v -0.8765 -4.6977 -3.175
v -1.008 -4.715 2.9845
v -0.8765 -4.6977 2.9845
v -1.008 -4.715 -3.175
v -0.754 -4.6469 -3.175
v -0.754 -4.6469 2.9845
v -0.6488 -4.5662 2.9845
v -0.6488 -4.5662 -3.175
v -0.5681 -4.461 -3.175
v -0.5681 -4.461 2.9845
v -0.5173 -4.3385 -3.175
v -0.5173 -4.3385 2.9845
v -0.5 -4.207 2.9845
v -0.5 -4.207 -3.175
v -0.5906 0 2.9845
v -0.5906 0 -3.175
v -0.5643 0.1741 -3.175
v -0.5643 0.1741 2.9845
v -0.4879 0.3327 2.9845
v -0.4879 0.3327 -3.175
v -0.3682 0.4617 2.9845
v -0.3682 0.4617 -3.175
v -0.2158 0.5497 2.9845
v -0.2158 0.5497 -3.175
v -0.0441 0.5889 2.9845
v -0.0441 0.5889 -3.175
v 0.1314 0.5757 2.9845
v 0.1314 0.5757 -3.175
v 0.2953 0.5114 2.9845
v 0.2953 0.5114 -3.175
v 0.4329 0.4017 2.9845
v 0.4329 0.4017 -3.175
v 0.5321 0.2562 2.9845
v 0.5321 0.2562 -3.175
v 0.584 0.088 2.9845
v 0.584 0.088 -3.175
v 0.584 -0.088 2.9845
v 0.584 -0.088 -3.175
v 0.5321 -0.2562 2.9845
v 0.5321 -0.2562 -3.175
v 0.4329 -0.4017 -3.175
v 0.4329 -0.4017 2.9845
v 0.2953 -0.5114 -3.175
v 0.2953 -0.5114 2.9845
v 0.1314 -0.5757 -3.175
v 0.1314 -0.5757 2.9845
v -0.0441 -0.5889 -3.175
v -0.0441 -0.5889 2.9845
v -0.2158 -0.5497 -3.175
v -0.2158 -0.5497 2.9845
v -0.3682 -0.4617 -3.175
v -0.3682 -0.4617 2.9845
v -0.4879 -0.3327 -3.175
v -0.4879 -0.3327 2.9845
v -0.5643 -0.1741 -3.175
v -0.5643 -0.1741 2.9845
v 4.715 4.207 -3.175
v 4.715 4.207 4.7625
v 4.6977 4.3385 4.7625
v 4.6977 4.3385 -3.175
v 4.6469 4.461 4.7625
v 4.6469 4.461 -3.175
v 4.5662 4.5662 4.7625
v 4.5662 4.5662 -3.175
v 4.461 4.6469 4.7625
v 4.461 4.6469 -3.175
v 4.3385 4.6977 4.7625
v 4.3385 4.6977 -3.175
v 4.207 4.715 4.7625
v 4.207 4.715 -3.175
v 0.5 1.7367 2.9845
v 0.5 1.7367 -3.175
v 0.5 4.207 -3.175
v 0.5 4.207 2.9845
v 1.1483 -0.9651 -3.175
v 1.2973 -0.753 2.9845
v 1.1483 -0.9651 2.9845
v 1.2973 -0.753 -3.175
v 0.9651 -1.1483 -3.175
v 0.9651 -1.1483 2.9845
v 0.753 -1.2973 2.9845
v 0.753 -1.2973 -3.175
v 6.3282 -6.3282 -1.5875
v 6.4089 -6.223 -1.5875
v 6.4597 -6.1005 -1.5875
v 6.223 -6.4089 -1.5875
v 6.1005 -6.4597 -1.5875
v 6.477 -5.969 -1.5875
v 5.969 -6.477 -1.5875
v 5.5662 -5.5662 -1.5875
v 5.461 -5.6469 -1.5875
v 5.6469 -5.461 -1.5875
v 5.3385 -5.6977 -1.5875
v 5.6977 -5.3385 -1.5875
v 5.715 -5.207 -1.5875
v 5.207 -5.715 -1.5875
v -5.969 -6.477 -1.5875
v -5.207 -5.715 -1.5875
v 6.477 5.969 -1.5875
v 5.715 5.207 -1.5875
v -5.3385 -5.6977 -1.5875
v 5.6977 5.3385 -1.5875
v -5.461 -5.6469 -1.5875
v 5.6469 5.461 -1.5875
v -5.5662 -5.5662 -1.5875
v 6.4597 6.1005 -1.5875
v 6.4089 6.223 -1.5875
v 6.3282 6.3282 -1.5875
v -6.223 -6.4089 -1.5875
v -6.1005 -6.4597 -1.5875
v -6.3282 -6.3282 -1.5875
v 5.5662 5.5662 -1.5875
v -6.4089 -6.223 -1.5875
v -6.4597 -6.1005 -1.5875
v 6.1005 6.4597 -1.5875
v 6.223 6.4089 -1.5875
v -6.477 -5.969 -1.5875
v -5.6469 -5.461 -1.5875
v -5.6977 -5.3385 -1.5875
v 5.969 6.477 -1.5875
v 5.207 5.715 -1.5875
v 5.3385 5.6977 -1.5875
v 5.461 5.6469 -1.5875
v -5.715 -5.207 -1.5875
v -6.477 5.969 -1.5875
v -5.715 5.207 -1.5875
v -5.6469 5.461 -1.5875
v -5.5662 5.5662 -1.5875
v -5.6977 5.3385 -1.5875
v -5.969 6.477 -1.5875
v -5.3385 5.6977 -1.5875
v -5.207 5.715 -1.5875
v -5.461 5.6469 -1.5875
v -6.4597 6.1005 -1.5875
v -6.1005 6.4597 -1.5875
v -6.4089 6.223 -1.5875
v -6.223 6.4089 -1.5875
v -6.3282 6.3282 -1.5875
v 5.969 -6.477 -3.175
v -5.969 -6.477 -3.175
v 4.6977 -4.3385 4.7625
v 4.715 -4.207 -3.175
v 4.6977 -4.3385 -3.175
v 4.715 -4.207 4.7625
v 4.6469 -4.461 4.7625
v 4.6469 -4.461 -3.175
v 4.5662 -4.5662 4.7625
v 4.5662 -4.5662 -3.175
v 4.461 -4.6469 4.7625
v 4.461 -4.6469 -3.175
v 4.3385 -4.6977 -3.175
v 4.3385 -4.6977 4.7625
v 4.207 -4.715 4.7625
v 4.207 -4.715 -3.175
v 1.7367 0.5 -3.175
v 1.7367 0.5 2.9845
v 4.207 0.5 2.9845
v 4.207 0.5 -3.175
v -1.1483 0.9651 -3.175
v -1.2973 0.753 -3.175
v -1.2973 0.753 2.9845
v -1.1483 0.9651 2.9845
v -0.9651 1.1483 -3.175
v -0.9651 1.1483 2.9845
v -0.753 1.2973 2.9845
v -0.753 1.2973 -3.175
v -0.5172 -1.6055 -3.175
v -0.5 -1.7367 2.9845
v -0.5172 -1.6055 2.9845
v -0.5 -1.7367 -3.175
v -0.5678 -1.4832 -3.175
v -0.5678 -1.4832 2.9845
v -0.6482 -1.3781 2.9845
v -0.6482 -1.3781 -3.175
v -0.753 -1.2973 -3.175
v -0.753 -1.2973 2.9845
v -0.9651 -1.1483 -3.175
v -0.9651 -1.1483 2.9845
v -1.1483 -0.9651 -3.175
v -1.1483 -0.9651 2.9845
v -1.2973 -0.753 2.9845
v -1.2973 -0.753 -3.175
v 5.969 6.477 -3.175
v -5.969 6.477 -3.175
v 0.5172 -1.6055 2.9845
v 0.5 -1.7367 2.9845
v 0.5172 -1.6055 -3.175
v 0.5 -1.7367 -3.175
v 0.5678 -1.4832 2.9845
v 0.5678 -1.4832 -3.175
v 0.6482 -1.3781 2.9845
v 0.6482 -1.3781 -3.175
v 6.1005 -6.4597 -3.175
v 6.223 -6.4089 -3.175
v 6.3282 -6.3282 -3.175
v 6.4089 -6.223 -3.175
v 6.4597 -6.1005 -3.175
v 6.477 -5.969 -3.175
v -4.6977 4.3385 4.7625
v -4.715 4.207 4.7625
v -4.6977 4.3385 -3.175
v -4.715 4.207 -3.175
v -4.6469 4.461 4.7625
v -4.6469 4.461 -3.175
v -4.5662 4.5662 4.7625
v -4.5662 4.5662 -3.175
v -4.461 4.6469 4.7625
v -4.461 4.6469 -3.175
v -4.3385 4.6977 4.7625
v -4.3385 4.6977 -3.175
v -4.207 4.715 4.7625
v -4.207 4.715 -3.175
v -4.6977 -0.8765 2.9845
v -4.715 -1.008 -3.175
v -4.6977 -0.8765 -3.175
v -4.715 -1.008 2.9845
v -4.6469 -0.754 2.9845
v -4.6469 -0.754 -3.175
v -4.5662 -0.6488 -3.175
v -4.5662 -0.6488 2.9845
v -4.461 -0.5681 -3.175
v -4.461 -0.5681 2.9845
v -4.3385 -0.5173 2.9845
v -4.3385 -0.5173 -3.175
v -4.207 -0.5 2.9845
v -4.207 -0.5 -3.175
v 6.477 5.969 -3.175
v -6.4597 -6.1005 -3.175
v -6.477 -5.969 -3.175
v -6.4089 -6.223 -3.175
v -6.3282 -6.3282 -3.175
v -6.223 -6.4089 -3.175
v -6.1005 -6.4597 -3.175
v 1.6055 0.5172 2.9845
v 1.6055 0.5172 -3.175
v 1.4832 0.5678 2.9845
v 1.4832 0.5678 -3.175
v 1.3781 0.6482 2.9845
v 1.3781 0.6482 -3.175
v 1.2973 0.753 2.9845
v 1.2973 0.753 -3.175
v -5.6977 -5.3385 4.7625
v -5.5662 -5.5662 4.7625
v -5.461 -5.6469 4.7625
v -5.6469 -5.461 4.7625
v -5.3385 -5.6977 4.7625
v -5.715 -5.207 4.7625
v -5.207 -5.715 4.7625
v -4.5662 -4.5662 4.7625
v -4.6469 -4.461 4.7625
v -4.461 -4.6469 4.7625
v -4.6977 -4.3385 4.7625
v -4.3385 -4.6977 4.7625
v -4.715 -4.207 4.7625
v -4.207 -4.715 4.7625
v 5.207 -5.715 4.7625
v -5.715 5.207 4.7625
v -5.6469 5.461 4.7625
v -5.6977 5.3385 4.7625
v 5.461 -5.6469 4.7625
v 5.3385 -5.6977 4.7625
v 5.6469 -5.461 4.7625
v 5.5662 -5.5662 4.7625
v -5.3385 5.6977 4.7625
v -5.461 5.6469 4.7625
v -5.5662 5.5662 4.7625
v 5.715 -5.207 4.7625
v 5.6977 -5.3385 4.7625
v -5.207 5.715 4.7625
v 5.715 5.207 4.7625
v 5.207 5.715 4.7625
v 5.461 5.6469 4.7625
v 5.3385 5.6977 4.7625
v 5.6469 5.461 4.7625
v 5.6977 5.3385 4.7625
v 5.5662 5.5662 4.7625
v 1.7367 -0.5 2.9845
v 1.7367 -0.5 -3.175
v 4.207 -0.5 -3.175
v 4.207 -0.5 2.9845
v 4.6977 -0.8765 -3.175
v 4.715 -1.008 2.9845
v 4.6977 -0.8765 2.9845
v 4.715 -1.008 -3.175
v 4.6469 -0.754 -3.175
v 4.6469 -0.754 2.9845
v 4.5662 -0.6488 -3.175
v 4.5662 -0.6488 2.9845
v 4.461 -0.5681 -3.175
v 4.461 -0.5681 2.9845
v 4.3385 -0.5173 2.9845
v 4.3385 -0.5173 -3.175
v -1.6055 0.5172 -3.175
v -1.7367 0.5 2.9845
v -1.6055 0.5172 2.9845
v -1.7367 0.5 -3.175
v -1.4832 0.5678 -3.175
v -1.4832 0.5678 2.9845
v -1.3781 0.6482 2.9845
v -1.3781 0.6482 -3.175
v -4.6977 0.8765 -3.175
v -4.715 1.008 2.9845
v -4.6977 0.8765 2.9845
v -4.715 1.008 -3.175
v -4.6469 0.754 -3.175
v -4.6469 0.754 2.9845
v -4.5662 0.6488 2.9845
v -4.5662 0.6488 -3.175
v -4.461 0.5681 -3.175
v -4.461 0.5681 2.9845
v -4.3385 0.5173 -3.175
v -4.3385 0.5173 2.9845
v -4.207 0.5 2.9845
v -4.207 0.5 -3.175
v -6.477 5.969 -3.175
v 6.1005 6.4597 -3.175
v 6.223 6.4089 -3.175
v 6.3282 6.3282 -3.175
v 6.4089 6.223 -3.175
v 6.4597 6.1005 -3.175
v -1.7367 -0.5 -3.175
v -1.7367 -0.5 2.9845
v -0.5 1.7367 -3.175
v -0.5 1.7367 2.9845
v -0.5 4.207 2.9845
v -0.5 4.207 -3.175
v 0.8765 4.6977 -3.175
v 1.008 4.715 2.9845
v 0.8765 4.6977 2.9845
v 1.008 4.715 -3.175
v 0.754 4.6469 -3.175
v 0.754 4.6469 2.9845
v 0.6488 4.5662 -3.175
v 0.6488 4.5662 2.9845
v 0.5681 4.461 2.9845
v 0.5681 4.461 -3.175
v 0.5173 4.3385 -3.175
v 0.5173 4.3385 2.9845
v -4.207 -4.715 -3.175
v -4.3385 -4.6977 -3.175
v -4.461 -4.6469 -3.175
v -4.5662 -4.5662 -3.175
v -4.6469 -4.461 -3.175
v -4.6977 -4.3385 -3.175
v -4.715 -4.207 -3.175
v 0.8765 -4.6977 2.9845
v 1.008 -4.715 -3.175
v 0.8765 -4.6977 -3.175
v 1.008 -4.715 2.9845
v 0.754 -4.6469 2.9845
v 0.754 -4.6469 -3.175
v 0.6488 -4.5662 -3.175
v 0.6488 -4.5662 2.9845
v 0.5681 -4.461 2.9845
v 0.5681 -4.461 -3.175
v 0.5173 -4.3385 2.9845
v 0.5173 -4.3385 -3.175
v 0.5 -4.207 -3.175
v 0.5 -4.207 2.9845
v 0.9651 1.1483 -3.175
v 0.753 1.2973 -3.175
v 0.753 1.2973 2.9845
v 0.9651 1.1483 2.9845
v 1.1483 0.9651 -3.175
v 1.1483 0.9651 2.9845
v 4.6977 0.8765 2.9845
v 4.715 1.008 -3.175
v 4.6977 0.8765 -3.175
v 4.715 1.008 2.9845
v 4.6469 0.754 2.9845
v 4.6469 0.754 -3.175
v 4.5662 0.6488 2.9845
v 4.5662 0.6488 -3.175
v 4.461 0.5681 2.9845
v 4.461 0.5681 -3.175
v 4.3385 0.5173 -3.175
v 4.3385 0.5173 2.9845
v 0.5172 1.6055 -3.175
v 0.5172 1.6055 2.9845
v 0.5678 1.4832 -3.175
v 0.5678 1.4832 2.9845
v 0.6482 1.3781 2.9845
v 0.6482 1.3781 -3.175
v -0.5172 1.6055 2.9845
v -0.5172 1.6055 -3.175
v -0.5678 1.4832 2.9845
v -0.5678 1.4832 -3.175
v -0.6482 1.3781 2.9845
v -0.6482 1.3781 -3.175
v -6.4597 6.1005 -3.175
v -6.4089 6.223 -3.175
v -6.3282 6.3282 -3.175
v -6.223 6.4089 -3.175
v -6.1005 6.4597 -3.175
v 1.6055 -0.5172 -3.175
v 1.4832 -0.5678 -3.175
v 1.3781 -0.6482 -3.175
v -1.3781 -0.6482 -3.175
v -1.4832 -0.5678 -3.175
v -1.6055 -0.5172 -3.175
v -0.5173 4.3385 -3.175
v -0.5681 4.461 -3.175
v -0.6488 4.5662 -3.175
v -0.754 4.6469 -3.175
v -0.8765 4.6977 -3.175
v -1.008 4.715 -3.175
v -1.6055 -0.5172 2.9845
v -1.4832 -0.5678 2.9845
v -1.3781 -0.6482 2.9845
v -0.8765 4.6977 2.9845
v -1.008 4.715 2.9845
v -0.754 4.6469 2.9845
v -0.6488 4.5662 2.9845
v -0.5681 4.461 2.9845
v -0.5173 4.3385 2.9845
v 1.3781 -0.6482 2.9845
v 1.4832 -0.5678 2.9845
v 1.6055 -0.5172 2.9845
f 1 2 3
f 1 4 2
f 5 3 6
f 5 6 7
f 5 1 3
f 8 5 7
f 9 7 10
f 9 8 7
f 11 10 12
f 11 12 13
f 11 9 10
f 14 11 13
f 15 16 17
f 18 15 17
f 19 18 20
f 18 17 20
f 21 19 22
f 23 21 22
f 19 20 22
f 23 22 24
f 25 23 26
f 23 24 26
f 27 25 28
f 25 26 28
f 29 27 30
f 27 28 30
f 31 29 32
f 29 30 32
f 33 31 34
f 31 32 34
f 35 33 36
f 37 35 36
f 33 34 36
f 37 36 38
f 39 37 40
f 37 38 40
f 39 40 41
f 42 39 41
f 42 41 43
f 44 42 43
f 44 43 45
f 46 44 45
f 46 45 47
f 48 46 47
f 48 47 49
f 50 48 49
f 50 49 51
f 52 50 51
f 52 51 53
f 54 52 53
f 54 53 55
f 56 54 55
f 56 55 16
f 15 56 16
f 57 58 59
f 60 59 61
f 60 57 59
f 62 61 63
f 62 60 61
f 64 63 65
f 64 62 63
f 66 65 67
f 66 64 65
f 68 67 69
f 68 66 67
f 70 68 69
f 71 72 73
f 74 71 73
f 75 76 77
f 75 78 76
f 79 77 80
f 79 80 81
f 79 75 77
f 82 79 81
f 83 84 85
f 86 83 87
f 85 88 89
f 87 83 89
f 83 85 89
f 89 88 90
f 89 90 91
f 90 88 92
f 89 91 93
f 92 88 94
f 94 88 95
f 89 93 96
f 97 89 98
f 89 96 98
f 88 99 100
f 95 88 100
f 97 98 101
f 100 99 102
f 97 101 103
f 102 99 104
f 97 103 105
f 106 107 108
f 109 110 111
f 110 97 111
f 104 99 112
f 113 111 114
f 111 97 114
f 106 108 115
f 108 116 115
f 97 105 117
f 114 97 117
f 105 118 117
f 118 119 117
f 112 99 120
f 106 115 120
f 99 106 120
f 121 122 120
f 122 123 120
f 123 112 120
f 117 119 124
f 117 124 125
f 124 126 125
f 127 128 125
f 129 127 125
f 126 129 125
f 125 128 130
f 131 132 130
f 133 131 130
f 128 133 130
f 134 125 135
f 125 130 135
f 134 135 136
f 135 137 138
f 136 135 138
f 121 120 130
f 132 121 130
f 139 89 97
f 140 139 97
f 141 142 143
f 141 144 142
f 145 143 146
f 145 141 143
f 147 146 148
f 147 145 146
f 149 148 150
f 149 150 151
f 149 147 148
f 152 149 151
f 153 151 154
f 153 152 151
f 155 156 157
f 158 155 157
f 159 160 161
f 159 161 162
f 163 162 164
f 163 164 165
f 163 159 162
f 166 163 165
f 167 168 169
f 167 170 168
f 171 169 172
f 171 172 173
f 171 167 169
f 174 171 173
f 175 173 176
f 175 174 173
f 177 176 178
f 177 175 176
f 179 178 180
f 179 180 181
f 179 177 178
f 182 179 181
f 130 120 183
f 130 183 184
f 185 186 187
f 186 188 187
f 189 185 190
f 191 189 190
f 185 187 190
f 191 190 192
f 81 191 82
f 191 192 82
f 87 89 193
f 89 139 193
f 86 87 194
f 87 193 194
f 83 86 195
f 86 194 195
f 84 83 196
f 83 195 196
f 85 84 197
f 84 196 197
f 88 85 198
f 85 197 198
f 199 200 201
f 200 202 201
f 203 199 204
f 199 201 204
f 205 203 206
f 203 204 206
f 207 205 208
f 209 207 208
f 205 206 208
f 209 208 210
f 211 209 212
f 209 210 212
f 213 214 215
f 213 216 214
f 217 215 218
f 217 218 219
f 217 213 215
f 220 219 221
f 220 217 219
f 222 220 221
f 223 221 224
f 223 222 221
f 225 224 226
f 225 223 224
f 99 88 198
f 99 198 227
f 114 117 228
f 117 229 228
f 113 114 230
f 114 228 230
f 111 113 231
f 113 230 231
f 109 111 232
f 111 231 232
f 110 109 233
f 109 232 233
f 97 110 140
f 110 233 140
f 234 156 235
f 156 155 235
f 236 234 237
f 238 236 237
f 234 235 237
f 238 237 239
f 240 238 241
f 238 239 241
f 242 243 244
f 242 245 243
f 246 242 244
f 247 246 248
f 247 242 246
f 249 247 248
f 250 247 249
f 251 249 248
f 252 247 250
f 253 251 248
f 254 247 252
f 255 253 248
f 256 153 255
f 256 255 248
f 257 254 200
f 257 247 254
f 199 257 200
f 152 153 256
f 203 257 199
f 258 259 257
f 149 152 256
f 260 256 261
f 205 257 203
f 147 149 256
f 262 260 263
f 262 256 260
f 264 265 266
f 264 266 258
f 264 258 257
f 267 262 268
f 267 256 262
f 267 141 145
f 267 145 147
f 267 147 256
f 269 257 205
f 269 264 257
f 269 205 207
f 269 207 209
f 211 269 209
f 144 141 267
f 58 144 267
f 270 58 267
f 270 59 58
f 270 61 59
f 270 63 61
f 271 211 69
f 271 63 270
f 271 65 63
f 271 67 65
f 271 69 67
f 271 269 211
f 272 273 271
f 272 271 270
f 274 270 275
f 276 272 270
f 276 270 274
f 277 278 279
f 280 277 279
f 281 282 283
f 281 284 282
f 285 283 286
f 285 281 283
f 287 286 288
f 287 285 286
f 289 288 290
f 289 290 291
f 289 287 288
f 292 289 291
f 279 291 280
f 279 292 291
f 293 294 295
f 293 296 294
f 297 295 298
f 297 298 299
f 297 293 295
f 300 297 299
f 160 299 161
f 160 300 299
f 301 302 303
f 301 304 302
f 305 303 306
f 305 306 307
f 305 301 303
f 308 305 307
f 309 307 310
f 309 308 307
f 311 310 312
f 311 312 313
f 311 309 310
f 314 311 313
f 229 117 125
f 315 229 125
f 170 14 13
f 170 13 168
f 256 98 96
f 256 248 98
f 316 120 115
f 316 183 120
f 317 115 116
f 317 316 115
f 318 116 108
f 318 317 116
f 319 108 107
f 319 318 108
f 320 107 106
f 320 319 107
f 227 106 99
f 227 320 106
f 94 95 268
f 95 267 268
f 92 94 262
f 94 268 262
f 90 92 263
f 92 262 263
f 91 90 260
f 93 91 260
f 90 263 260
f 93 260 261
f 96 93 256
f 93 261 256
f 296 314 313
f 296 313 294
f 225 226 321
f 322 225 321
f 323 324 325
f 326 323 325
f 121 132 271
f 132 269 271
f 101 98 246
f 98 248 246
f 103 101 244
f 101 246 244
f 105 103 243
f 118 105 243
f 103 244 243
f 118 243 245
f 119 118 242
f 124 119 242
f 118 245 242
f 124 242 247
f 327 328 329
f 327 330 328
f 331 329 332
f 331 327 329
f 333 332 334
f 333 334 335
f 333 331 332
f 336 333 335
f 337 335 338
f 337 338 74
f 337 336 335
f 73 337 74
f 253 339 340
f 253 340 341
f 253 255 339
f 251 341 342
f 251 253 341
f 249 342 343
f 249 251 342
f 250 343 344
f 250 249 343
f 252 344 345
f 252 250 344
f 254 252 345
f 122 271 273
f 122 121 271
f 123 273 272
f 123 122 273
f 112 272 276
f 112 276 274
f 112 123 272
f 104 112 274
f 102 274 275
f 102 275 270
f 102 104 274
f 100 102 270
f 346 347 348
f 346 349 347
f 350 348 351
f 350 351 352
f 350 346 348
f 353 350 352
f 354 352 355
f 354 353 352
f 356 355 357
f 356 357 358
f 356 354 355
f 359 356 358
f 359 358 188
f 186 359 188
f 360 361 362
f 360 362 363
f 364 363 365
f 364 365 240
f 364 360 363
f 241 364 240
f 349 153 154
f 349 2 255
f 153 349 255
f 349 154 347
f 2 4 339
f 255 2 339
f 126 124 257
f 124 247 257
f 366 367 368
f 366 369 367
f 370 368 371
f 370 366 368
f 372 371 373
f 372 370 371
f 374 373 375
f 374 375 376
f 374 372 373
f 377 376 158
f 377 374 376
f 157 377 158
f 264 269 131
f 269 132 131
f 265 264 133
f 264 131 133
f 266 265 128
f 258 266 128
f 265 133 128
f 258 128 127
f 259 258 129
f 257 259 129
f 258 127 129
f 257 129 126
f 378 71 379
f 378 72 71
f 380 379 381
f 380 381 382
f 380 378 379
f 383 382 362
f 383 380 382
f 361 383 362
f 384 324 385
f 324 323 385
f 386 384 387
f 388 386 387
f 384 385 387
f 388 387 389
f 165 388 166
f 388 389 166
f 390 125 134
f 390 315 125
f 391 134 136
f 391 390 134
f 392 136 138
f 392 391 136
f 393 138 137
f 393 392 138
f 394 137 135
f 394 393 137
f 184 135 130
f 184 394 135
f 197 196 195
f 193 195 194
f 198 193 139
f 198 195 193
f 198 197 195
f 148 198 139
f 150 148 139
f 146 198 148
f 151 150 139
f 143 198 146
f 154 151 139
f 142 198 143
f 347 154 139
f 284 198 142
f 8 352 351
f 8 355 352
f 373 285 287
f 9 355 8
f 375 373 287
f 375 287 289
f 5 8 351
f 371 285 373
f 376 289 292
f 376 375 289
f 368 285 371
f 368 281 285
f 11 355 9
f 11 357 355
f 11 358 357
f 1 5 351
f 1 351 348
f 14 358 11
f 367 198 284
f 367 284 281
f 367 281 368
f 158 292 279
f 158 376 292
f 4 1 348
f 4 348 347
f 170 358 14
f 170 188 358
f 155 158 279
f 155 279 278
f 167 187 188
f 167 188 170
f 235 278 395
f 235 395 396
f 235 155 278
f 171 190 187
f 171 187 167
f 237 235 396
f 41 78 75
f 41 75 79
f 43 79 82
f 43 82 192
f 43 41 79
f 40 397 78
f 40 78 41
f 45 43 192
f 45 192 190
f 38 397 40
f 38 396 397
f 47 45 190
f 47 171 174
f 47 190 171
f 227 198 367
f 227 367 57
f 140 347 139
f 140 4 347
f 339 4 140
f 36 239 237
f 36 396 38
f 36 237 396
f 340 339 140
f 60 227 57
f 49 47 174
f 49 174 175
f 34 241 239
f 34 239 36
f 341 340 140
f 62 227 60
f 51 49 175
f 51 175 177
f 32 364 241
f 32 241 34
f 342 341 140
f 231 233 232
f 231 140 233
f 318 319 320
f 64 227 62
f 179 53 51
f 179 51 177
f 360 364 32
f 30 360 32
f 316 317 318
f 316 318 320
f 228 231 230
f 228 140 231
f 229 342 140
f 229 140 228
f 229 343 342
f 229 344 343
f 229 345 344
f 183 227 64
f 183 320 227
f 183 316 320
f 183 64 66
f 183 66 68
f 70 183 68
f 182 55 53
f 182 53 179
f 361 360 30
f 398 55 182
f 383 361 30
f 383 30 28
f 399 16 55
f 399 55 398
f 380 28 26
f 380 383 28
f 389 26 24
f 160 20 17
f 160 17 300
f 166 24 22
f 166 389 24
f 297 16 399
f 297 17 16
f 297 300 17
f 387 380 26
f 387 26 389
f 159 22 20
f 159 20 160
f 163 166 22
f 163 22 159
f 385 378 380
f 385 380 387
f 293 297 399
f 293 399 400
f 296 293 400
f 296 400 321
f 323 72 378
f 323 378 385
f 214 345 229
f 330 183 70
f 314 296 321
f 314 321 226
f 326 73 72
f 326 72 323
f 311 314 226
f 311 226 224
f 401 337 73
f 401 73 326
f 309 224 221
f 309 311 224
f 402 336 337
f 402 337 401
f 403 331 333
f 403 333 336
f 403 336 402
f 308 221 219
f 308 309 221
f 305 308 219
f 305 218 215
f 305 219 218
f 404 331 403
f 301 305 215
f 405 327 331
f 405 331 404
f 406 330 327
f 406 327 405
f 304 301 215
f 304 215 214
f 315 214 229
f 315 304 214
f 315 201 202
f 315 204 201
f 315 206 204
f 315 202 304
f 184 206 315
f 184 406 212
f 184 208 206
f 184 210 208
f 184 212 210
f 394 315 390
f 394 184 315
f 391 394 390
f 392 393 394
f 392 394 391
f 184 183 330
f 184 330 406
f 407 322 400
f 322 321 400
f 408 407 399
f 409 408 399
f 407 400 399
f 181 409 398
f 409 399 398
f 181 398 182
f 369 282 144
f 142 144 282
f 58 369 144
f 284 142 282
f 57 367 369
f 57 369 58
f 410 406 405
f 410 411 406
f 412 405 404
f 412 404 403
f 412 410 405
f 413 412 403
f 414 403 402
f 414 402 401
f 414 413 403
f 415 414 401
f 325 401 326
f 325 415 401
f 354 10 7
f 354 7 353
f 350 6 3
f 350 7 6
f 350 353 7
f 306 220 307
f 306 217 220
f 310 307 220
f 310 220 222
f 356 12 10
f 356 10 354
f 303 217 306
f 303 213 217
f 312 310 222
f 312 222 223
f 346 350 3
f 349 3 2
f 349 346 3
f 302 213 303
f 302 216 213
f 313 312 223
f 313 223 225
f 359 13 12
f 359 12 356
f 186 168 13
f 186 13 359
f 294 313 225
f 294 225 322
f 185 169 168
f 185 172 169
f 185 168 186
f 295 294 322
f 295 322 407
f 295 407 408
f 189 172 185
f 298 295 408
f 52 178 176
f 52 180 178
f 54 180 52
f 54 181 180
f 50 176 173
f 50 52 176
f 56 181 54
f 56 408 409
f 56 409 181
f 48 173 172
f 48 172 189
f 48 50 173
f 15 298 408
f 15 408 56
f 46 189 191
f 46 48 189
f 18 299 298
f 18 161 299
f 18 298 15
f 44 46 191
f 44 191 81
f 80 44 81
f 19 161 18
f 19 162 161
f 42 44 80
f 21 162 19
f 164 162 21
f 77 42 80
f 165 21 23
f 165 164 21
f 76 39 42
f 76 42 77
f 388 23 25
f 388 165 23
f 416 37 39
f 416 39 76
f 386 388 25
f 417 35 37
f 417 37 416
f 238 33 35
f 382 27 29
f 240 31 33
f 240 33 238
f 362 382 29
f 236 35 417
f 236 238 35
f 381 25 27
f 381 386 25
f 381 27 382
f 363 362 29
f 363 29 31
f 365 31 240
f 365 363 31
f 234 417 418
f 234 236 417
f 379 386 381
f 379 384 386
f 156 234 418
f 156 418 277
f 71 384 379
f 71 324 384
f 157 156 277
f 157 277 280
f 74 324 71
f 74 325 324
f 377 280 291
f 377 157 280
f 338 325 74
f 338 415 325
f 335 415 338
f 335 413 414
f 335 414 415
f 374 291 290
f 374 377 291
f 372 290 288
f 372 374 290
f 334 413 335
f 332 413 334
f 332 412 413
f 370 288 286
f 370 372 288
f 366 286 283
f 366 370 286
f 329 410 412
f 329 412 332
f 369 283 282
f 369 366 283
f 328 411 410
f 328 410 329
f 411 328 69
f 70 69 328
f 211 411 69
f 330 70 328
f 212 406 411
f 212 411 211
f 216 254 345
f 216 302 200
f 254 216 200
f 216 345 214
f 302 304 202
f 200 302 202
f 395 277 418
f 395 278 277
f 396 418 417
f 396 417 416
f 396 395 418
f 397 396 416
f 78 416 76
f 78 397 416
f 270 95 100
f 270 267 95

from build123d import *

# Parameters (mm, degrees)
SKETCH1_W                    = 11.43
SKETCH1_H                    = 11.43
BOSS_EXTRUDE1_DEPTH          = 4.7625
BOSS_EXTRUDE1_DEPTH_BACK     = 1.5875
SKETCH2_W                    = 12.954
SKETCH2_H                    = 12.954
BOSS_EXTRUDE2_DEPTH          = 1.5875
SHELL1_T                     = -1
SKETCH15_R                   = 1.499997
BOSS_EXTRUDE3_DEPTH          = 6.1595
SKETCH16_W                   = 1
SKETCH16_H                   = 9.43
SKETCH16_W_2                 = 9.43
SKETCH16_H_2                 = 1
EXTRUDE_THIN1_DEPTH          = 6.1595
BOSS_EXTRUDE4_REACH          = 9.938
SKETCH17_W                   = 10.954
SKETCH17_H                   = 10.954
SKETCH17_W_2                 = 9.43
SKETCH17_H_2                 = 9.43
FILLET7_R                    = 0.508
FILLET8_R                    = 0.508
F_56_0_0465_DIAMETER_HOLE1_D = 1.1811


with BuildPart() as part:
    # Sketch1 → Boss-Extrude1 (new body, two sides)
    with BuildSketch(Plane.XY) as boss_extrude1_sk:
        Rectangle(SKETCH1_W, SKETCH1_H)
    extrude(amount=BOSS_EXTRUDE1_DEPTH)
    extrude(boss_extrude1_sk.sketch, amount=-BOSS_EXTRUDE1_DEPTH_BACK)

    # Sketch2 → Boss-Extrude2 (add)
    with BuildSketch(Plane(origin=(0, 0, -1.5875), x_dir=(-1, 0, 0), z_dir=(0, 0, -1))):
        Rectangle(SKETCH2_W, SKETCH2_H)
    extrude(amount=BOSS_EXTRUDE2_DEPTH)

    # Shell1
    shell1_openings = [part.faces().sort_by_distance(p)[0] for p in [
        (0, 0, 4.7625),
        (0, 0, -3.175),
    ]]
    offset(amount=SHELL1_T, openings=shell1_openings, kind=Kind.INTERSECTION)



with BuildPart() as body_2:
    # Sketch15 → Boss-Extrude3 (new body)
    with BuildSketch(Plane(origin=(0, 0, -3.175), x_dir=(-1, 0, 0), z_dir=(0, 0, -1))):
        Circle(SKETCH15_R)
    extrude(amount=-BOSS_EXTRUDE3_DEPTH)


with BuildPart() as part_1:
    add(part.part)

    add(body_2.part)  # Extrude-Thin1 merges body 2
    # Sketch16 → Extrude-Thin1 (add)
    with BuildSketch(Plane.XY.offset(2.9845)):
        Rectangle(SKETCH16_W, SKETCH16_H)
        Rectangle(SKETCH16_W_2, SKETCH16_H_2)
    extrude(amount=-EXTRUDE_THIN1_DEPTH)

    # Sketch17 → Boss-Extrude4 (add, up to next)
    with BuildSketch(Plane(origin=(0, 0, -3.175), x_dir=(-1, 0, 0), z_dir=(0, 0, -1)), mode=Mode.PRIVATE) as boss_extrude4_sk1:
        Rectangle(SKETCH17_W, SKETCH17_H)
        Rectangle(SKETCH17_W_2, SKETCH17_H_2, mode=Mode.SUBTRACT)
    boss_extrude4_tool1 = extrude(boss_extrude4_sk1.sketch, amount=-BOSS_EXTRUDE4_REACH, mode=Mode.PRIVATE) - part_1.part
    add(boss_extrude4_tool1.solids().sort_by_distance((0, 5.322087, -3.175))[0])

    # Fillet7
    fillet7_edges = [part_1.edges().sort_by_distance(p)[0] for p in [
        (-6.477, 6.477, -2.38125),
        (6.477, 6.477, -2.38125),
        (6.477, -6.477, -2.38125),
        (-6.477, -6.477, -2.38125),
        (5.715, -5.715, 1.5875),
        (-5.715, -5.715, 1.5875),
        (-5.715, 5.715, 1.5875),
        (5.715, 5.715, 1.5875),
    ]]
    fillet(fillet7_edges, radius=FILLET7_R)

    # Fillet8
    fillet8_edges = [part_1.edges().sort_by_distance(p)[0] for p in [
        (4.715, 0.5, -0.09525),
        (-4.715, -0.5, -0.09525),
        (1.41421038, 0.5, -0.09525),
        (1.41421038, -0.5, -0.09525),
        (4.715, -0.5, -0.09525),
        (-4.715, 0.5, -0.09525),
        (4.715, 4.715, 0.79375),
        (4.715, -4.715, 0.79375),
        (-4.715, -4.715, 0.79375),
        (-4.715, 4.715, 0.79375),
        (-0.5, 4.715, -0.09525),
        (0.5, -4.715, -0.09525),
        (-0.5, -4.715, -0.09525),
        (0.5, 4.715, -0.09525),
        (0.5, 1.41421038, -0.09525),
        (0.5, -1.41421038, -0.09525),
        (-0.5, 1.41421038, -0.09525),
        (-0.5, -1.41421038, -0.09525),
        (-1.41421038, -0.5, -0.09525),
        (-1.41421038, 0.5, -0.09525),
    ]]
    fillet(fillet8_edges, radius=FILLET8_R)

    # #56 (0.0465) Diameter Hole1 (through all)
    with Locations(Plane.XY.offset(2.9845)):
        with Locations((0, 0)):
            Hole(F_56_0_0465_DIAMETER_HOLE1_D / 2)


solid = part_1.part
